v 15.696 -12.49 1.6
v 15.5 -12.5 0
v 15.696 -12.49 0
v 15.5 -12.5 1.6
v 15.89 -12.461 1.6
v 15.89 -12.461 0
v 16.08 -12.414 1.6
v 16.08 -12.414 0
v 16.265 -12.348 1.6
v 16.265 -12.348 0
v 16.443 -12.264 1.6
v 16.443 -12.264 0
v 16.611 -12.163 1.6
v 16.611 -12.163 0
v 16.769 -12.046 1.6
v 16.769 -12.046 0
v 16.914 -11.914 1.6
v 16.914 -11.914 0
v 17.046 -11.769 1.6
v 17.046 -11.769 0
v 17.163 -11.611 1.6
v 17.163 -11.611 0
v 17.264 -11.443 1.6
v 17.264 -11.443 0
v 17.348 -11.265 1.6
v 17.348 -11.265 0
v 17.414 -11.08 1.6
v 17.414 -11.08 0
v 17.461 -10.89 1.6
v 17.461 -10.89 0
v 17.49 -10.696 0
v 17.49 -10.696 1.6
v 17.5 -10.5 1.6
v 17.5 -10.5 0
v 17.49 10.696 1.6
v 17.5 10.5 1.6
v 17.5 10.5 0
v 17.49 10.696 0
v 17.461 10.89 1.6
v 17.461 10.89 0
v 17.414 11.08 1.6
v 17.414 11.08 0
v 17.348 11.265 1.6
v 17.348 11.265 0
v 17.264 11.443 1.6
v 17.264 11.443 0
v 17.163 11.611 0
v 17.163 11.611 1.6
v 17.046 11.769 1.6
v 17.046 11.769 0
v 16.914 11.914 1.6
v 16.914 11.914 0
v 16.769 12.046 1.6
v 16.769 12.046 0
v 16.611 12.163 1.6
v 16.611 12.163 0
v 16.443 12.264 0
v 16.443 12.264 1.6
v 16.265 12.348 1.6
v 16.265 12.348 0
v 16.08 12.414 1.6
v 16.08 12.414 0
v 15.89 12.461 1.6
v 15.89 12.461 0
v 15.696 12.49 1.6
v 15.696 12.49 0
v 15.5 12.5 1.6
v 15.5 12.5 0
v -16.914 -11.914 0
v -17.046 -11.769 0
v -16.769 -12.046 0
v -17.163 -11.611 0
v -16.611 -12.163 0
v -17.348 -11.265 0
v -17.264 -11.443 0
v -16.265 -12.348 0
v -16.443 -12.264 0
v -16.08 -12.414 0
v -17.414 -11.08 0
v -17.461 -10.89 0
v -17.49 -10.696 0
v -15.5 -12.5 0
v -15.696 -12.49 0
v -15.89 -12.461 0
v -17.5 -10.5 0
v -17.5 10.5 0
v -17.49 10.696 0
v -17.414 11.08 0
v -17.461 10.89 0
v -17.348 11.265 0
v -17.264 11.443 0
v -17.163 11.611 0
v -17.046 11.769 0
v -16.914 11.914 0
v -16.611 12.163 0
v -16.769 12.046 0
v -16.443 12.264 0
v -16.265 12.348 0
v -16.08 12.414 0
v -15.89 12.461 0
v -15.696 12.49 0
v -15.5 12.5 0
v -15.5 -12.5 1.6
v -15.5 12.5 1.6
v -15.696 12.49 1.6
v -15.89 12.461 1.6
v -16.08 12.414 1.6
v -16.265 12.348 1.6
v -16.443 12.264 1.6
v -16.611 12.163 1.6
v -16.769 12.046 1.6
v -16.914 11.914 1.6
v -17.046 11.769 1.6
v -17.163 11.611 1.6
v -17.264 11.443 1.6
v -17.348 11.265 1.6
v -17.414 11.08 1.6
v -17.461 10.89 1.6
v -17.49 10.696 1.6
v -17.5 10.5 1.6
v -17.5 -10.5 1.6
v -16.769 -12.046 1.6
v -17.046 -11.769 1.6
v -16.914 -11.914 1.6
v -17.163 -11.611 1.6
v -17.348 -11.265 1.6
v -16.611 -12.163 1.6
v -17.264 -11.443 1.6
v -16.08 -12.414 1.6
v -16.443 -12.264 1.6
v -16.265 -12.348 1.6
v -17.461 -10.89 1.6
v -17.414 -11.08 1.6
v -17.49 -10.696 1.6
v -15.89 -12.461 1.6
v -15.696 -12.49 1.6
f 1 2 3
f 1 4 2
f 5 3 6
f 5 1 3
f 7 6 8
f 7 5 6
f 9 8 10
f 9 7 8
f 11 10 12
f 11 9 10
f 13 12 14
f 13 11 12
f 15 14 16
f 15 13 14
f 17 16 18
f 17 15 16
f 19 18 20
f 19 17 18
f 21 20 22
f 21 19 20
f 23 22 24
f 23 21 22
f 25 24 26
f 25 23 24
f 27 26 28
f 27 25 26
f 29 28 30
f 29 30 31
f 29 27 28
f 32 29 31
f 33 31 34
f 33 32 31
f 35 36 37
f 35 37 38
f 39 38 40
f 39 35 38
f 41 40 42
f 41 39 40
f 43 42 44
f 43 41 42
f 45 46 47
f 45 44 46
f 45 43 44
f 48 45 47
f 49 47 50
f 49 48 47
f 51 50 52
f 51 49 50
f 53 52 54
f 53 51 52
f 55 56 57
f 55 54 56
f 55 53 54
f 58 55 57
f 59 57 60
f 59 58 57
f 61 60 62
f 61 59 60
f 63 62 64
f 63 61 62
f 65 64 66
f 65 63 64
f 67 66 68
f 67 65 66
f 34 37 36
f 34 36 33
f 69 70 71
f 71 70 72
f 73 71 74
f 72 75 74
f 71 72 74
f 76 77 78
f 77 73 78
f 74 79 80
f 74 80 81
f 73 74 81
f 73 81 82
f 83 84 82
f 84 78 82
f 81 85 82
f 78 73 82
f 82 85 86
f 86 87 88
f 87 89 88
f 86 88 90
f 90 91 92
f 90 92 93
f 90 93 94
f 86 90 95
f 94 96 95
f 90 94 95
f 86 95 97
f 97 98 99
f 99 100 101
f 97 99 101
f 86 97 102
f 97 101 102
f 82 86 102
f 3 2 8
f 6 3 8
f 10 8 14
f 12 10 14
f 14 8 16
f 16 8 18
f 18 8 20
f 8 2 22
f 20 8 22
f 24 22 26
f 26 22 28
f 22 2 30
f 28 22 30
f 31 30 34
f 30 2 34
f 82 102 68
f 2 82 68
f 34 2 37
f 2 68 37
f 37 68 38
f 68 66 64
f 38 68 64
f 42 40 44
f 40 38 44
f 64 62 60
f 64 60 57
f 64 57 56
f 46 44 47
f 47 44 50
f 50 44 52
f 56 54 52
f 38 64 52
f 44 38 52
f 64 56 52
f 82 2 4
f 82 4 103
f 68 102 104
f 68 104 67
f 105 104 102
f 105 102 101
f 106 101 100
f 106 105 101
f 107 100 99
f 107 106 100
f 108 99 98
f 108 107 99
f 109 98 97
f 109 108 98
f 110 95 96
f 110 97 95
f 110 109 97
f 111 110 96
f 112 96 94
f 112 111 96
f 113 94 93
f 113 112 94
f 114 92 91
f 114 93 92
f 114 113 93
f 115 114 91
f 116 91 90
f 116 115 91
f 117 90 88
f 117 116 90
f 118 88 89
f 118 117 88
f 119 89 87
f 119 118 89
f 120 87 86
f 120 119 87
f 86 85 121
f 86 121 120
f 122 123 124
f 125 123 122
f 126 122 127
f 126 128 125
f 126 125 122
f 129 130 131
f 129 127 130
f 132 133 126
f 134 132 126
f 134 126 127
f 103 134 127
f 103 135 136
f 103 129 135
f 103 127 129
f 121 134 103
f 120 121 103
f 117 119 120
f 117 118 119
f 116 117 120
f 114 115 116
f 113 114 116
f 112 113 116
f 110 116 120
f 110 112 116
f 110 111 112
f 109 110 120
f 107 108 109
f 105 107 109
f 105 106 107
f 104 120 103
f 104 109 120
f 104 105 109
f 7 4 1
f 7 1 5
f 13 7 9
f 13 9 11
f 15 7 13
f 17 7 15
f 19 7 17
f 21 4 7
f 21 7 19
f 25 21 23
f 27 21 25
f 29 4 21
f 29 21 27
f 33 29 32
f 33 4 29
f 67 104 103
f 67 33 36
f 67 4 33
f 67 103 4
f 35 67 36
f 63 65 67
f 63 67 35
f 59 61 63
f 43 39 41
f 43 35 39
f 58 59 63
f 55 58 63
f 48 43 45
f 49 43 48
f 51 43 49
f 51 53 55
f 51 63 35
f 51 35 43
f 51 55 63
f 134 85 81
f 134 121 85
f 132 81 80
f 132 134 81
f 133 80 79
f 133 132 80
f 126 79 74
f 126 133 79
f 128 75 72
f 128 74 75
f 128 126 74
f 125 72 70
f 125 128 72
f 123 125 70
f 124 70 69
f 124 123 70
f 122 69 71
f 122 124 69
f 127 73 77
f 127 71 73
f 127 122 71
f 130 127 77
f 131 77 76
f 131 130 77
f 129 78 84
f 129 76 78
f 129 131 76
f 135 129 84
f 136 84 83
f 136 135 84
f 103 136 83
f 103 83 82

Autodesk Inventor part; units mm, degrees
ref_plane "YZ Plane" through (0, 0, 0) normal (1, 0, 0) x (0, 1, 0)
ref_plane "XZ Plane" through (0, 0, 0) normal (0, 1, 0) x (-1, 0, 0)
ref_plane "XY Plane" through (0, 0, 0) normal (0, 0, 1) x (1, 0, 0)
sketch "Sketch3" plane through (0, 0, 0) normal (0, 0, 1) x (1, 0, 0)
  line L0 (17.4998, -12.4998) -> (-17.4998, -12.4998)
  line L1 (-17.4998, -12.4998) -> (-17.4998, 12.4998)
  line L2 (-17.4998, 12.4998) -> (17.4998, 12.4998)
  line L3 (17.4998, 12.4998) -> (17.4998, -12.4998)
  line L4 (17.4998, -12.4998) -> (-17.4998, 12.4998) construction
  line L5 (-17.4998, -12.4998) -> (17.4998, 12.4998) construction
  point P0 (0, 0)
extrude "Extrusion2" add sketch "Sketch3" along normal blind 1.6
fillet "Fillet2" radius 2 4 edges at (-17.4998, -12.4998, 0.8) (17.4998, -12.4998, 0.8) (17.4998, 12.4998, 0.8) (-17.4998, 12.4998, 0.8)
properties part number "pcb_placeholder_larger"
